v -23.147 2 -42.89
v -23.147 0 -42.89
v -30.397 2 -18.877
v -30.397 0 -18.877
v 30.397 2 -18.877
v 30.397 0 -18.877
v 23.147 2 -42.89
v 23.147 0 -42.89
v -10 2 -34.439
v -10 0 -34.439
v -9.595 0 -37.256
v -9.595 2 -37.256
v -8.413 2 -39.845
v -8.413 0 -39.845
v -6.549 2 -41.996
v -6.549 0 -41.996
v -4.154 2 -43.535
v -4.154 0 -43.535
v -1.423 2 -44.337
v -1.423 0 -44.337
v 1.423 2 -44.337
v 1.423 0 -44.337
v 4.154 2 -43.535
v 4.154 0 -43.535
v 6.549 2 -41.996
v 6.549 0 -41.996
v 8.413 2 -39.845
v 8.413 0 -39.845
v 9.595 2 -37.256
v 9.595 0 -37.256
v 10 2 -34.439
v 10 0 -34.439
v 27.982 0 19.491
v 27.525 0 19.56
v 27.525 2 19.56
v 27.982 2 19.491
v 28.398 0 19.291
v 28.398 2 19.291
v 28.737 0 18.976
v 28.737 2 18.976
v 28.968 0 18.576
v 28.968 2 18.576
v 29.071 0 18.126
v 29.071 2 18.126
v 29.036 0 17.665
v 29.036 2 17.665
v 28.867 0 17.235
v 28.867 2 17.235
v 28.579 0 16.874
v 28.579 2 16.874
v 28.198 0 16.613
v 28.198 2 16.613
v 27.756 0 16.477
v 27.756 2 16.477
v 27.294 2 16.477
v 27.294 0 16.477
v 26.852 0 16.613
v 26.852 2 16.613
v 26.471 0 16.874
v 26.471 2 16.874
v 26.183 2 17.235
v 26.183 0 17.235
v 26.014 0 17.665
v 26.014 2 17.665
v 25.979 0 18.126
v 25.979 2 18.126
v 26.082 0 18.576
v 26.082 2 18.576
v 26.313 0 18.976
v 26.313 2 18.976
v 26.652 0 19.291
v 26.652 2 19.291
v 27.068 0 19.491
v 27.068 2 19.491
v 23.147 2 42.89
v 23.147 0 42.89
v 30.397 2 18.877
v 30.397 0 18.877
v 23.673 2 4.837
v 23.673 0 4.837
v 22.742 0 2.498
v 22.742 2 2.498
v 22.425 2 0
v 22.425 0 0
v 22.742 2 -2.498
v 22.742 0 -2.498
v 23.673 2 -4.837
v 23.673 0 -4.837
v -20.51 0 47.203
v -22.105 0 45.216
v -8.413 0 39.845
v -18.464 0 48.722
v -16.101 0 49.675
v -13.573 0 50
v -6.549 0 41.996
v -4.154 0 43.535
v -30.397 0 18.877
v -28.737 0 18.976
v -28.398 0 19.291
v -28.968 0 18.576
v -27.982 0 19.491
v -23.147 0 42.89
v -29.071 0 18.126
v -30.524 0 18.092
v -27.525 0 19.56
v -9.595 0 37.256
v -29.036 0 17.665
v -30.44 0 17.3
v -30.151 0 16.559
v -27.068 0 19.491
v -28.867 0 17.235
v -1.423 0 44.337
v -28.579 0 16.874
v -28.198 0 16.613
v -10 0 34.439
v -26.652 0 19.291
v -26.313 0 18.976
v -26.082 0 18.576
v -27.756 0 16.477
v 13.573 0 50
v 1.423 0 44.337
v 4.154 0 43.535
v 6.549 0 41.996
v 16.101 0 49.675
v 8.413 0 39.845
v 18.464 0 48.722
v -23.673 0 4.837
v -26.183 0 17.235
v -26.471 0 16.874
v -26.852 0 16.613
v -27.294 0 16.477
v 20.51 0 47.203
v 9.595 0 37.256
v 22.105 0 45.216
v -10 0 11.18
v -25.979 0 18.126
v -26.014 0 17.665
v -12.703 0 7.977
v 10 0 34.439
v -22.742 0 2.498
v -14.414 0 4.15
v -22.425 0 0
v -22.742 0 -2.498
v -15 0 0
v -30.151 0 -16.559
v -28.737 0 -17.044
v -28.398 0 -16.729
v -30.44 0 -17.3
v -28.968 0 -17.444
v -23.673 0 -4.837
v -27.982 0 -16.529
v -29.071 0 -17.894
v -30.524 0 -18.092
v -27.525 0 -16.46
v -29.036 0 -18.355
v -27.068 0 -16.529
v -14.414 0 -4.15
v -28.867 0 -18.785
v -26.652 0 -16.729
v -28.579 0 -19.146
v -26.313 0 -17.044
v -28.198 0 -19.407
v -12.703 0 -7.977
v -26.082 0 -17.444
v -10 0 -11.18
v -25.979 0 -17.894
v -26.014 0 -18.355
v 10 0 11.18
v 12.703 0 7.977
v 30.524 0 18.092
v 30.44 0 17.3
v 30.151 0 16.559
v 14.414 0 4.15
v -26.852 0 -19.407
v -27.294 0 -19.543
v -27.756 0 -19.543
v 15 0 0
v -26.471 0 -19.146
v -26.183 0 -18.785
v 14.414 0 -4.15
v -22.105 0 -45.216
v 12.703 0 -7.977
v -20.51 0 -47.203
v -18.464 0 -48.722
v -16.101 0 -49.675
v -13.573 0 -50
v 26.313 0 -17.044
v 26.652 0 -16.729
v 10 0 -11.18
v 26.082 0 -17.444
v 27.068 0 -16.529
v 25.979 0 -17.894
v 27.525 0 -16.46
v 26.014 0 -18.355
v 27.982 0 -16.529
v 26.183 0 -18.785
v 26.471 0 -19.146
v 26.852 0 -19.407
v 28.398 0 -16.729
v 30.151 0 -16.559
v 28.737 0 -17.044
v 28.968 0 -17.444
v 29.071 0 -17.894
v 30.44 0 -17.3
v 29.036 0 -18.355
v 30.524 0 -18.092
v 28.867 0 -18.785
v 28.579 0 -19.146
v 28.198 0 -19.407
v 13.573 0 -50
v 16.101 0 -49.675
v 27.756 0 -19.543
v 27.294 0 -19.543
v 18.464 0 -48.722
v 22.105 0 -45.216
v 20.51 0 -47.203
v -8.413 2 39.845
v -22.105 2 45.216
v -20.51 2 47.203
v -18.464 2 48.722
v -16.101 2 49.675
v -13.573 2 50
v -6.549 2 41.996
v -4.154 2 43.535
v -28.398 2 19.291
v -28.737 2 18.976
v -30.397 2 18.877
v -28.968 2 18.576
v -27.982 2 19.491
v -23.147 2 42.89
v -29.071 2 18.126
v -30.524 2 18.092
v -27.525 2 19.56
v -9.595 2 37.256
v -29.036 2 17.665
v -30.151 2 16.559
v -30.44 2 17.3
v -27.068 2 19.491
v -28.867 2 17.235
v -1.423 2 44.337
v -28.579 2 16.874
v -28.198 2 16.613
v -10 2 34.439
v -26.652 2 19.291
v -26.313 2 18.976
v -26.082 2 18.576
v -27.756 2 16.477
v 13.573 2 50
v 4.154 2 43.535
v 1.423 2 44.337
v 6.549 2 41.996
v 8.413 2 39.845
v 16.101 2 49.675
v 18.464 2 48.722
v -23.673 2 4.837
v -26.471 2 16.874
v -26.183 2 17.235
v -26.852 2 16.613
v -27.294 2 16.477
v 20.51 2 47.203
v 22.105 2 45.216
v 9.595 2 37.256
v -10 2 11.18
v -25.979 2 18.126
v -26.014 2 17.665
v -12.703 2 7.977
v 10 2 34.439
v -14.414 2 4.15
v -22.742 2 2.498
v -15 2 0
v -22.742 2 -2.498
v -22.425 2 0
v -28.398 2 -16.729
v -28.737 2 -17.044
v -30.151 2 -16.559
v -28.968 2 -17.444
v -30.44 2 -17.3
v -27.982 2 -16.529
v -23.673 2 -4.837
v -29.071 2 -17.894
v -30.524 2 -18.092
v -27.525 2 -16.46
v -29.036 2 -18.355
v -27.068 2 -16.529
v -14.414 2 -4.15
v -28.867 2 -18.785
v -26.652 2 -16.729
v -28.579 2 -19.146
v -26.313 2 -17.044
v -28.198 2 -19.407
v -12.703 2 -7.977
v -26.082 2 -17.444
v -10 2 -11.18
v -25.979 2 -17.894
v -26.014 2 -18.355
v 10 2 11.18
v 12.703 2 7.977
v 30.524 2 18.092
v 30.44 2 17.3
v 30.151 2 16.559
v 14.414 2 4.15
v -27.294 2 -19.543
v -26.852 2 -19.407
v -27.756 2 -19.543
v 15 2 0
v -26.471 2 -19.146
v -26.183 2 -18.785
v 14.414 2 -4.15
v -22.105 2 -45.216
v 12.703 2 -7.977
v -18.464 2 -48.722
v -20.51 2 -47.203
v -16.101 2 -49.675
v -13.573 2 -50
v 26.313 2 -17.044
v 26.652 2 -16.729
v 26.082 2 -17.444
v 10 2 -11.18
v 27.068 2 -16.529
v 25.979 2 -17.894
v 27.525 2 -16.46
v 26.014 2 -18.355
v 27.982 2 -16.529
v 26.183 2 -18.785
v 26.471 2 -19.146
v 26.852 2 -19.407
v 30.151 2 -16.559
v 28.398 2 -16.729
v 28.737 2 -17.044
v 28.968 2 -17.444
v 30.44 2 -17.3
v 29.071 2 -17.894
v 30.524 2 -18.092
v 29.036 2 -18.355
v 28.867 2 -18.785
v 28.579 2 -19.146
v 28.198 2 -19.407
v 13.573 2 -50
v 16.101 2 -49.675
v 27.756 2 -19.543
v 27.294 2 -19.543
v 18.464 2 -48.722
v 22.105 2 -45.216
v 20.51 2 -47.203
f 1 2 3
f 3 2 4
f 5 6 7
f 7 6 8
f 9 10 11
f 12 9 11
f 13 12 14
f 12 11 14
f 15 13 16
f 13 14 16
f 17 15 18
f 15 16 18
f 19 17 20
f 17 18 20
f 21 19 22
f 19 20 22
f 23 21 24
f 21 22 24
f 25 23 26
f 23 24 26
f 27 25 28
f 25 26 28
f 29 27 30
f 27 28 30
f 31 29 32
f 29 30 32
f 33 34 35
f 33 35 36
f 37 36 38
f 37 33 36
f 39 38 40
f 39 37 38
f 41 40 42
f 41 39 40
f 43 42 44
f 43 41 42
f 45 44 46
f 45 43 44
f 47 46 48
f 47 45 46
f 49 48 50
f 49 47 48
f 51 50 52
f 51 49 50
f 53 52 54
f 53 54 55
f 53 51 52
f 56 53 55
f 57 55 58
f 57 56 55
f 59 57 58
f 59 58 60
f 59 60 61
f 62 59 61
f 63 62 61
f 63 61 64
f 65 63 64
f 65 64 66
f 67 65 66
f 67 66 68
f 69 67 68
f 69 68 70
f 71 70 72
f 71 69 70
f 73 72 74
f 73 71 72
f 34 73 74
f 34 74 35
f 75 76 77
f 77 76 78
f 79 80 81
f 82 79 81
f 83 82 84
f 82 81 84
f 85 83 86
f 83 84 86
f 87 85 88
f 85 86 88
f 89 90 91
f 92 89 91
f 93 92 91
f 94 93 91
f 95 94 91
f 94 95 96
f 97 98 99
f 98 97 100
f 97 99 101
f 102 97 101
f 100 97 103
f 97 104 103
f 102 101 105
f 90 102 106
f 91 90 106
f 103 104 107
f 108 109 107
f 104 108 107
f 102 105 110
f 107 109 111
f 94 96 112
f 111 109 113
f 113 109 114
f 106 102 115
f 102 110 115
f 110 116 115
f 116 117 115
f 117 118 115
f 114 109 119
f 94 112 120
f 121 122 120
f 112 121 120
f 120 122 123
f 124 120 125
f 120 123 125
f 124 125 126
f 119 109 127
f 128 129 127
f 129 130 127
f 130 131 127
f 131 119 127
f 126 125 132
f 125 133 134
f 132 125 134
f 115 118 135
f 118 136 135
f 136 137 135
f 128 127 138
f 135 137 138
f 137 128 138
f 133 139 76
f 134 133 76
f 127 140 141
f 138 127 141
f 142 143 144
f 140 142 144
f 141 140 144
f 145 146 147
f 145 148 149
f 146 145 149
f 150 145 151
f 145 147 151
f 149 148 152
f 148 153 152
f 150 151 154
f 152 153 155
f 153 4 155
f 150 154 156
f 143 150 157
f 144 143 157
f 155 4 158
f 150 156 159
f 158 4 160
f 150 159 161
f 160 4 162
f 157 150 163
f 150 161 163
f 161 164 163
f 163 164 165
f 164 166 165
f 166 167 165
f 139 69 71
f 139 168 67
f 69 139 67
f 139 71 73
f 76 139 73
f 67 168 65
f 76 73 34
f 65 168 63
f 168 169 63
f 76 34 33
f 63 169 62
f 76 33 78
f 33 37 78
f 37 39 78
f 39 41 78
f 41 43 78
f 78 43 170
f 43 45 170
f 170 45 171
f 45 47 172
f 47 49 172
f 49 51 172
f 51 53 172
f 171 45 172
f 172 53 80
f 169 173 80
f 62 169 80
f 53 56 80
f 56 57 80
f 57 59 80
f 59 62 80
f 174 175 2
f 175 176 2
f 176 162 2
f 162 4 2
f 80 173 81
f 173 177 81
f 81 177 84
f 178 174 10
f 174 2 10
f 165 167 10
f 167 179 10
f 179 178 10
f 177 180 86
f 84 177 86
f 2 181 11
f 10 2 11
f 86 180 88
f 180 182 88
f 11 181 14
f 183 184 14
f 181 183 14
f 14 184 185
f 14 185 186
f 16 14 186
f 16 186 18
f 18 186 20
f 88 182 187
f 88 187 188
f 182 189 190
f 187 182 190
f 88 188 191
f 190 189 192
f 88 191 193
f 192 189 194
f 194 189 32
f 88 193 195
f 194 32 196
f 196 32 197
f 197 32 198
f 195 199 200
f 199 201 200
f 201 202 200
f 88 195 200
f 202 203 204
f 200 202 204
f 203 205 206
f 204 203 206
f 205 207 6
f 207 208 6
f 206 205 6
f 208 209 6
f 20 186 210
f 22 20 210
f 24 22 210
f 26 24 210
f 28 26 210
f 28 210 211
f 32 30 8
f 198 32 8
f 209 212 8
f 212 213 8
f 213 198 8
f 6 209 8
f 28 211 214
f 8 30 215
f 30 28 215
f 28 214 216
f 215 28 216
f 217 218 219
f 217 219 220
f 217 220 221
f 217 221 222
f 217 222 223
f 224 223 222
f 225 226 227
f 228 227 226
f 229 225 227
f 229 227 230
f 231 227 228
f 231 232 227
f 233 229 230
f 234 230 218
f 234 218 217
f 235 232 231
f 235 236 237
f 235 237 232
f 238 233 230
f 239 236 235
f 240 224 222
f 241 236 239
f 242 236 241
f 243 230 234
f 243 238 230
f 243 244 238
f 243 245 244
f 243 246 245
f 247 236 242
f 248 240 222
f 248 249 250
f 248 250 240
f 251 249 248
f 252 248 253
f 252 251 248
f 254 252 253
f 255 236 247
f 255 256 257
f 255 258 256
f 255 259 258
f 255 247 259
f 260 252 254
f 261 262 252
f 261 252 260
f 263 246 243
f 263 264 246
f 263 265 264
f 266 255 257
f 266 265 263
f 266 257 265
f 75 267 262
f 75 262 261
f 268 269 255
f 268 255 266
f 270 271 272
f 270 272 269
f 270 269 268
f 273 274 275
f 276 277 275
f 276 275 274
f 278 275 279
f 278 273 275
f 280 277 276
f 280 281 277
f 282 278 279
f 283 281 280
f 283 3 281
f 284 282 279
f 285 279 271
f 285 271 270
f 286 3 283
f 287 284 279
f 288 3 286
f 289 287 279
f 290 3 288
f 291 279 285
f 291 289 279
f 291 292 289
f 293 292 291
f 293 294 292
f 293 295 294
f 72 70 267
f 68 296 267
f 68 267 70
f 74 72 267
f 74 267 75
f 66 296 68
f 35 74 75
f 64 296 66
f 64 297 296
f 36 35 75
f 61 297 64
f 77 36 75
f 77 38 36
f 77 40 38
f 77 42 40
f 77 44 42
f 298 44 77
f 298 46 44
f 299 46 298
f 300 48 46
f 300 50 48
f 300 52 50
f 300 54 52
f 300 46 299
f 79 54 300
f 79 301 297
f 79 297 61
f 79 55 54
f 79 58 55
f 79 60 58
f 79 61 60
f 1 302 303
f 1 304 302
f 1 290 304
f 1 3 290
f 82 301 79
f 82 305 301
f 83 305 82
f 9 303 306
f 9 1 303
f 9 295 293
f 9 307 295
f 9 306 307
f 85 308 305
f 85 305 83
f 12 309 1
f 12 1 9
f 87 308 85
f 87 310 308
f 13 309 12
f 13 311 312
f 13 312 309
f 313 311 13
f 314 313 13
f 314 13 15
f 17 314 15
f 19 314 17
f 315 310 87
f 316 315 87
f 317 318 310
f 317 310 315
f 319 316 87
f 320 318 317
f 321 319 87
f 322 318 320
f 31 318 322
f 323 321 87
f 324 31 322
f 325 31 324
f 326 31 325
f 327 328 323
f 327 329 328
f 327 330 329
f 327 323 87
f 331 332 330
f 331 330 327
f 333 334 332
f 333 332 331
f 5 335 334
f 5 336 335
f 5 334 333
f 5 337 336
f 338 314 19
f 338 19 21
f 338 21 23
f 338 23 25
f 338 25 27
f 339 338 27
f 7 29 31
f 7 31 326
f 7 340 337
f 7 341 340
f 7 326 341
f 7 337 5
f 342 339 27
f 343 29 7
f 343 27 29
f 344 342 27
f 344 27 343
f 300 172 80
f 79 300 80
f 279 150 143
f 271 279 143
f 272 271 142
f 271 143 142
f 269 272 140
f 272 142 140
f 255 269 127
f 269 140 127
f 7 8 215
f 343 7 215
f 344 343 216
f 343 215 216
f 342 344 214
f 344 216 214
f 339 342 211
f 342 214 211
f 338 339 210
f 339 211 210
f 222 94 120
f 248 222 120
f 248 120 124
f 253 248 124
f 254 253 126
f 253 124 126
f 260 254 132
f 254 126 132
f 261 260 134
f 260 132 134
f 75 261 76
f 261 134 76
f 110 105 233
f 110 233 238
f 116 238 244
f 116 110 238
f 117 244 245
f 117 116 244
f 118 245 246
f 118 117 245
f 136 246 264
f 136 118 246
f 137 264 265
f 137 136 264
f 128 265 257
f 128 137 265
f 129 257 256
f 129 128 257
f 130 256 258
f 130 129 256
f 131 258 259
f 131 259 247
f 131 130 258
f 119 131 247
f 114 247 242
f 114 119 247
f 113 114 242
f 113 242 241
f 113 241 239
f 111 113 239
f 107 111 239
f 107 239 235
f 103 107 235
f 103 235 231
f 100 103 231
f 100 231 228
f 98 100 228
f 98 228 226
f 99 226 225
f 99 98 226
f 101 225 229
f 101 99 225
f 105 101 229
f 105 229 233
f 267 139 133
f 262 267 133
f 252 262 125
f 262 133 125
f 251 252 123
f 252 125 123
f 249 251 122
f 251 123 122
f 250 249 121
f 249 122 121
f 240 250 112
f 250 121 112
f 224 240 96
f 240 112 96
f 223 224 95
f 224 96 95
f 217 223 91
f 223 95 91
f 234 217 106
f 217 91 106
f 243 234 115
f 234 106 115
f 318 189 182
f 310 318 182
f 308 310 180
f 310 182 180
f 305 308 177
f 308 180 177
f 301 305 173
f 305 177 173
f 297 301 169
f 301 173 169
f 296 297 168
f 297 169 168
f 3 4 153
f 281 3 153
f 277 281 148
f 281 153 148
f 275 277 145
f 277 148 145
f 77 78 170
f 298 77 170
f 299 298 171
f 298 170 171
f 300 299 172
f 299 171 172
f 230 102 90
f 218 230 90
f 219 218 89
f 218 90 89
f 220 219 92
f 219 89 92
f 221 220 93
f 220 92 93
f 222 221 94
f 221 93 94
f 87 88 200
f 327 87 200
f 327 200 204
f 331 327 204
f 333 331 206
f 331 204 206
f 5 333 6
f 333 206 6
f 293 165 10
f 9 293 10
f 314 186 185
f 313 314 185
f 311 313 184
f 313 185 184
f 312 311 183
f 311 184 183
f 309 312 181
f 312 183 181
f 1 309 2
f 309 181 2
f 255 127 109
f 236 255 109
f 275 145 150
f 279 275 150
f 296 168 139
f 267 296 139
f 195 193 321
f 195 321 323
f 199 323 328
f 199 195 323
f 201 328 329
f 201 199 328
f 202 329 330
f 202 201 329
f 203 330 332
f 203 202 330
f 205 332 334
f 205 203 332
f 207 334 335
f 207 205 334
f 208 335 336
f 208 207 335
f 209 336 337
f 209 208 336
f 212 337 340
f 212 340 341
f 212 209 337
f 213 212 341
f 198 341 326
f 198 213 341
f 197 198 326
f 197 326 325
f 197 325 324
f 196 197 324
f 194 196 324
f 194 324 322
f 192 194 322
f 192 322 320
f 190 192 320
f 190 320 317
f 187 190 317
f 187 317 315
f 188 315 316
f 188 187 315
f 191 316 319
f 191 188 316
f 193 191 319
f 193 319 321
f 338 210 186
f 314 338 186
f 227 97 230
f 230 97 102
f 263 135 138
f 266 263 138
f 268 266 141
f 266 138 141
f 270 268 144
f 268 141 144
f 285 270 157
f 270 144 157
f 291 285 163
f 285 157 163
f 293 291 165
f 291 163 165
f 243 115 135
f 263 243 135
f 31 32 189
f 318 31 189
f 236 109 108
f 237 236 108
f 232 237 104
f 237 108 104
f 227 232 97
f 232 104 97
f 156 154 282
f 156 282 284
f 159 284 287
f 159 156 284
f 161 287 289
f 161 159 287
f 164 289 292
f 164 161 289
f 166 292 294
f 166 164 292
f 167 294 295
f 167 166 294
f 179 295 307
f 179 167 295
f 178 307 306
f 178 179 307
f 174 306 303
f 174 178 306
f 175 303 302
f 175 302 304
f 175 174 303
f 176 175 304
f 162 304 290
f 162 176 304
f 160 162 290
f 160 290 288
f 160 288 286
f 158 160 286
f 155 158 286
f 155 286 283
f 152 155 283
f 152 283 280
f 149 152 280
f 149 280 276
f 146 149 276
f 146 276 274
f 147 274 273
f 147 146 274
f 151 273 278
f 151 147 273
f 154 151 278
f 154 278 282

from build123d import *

# Parameters (mm, degrees)
SKETCH1_R           = 1.55
BOSS_EXTRUDE1_DEPTH = 2


with BuildPart() as part:
    # Sketch1 → Boss-Extrude1 (new body)
    with BuildSketch(Plane(origin=(0, 0, 0), x_dir=(1, 0, 0), z_dir=(0, 1, 0))):
        with BuildLine():
            ThreePointArc((-23.146596832, -42.890430613), (-19.535637384, -48.028209829), (-13.573435866, -50))
            Line((-13.573435866, -50), (13.573435866, -50))
            ThreePointArc((13.573435866, -50), (19.535637384, -48.028209829), (23.146596832, -42.890430613))
            Line((23.146596832, -42.890430613), (30.39694829, -18.877129184))
            ThreePointArc((30.39694829, -18.877129184), (30.508221739, -17.693159259), (30.150742695, -16.558974398))
            Line((30.150742695, -16.558974398), (23.672863187, -4.836752006))
            ThreePointArc((23.672863187, -4.836752006), (22.425338839, 0), (23.672863187, 4.836752006))
            Line((23.672863187, 4.836752006), (30.150742695, 16.558974398))
            ThreePointArc((30.150742695, 16.558974398), (30.508221739, 17.693159259), (30.39694829, 18.877129184))
            Line((30.39694829, 18.877129184), (23.146596832, 42.890430613))
            ThreePointArc((23.146596832, 42.890430613), (19.535637384, 48.028209829), (13.573435866, 50))
            Line((13.573435866, 50), (-13.573435866, 50))
            ThreePointArc((-13.573435866, 50), (-19.535637384, 48.028209829), (-23.146596832, 42.890430613))
            Line((-23.146596832, 42.890430613), (-30.39694829, 18.877129184))
            ThreePointArc((-30.39694829, 18.877129184), (-30.508221739, 17.693159259), (-30.150742695, 16.558974398))
            Line((-30.150742695, 16.558974398), (-23.672863187, 4.836752006))
            ThreePointArc((-23.672863187, 4.836752006), (-22.425338839, 0), (-23.672863187, -4.836752006))
            Line((-23.672863187, -4.836752006), (-30.150742695, -16.558974398))
            ThreePointArc((-30.150742695, -16.558974398), (-30.508221739, -17.693159259), (-30.39694829, -18.877129184))
            Line((-30.39694829, -18.877129184), (-23.146596832, -42.890430613))
        make_face()
        with BuildLine():
            ThreePointArc((10, -34.438564592), (0, -44.438564592), (-10, -34.438564592))
            Line((-10, -34.438564592), (-10, -11.180339887))
            ThreePointArc((-10, -11.180339887), (-15, 0), (-10, 11.180339887))
            Line((-10, 11.180339887), (-10, 34.438564592))
            ThreePointArc((-10, 34.438564592), (0, 44.438564592), (10, 34.438564592))
            Line((10, 34.438564592), (10, 11.180339887))
            ThreePointArc((10, 11.180339887), (15, 0), (10, -11.180339887))
            Line((10, -11.180339887), (10, -34.438564592))
        make_face(mode=Mode.SUBTRACT)
        with Locations((-27.525, -18.01)):
            Circle(SKETCH1_R, mode=Mode.SUBTRACT)
        with Locations((-27.525, 18.01)):
            Circle(SKETCH1_R, mode=Mode.SUBTRACT)
        with Locations((27.525, 18.01)):
            Circle(SKETCH1_R, mode=Mode.SUBTRACT)
        with Locations((27.525, -18.01)):
            Circle(SKETCH1_R, mode=Mode.SUBTRACT)
    extrude(amount=BOSS_EXTRUDE1_DEPTH)


solid = part.part
